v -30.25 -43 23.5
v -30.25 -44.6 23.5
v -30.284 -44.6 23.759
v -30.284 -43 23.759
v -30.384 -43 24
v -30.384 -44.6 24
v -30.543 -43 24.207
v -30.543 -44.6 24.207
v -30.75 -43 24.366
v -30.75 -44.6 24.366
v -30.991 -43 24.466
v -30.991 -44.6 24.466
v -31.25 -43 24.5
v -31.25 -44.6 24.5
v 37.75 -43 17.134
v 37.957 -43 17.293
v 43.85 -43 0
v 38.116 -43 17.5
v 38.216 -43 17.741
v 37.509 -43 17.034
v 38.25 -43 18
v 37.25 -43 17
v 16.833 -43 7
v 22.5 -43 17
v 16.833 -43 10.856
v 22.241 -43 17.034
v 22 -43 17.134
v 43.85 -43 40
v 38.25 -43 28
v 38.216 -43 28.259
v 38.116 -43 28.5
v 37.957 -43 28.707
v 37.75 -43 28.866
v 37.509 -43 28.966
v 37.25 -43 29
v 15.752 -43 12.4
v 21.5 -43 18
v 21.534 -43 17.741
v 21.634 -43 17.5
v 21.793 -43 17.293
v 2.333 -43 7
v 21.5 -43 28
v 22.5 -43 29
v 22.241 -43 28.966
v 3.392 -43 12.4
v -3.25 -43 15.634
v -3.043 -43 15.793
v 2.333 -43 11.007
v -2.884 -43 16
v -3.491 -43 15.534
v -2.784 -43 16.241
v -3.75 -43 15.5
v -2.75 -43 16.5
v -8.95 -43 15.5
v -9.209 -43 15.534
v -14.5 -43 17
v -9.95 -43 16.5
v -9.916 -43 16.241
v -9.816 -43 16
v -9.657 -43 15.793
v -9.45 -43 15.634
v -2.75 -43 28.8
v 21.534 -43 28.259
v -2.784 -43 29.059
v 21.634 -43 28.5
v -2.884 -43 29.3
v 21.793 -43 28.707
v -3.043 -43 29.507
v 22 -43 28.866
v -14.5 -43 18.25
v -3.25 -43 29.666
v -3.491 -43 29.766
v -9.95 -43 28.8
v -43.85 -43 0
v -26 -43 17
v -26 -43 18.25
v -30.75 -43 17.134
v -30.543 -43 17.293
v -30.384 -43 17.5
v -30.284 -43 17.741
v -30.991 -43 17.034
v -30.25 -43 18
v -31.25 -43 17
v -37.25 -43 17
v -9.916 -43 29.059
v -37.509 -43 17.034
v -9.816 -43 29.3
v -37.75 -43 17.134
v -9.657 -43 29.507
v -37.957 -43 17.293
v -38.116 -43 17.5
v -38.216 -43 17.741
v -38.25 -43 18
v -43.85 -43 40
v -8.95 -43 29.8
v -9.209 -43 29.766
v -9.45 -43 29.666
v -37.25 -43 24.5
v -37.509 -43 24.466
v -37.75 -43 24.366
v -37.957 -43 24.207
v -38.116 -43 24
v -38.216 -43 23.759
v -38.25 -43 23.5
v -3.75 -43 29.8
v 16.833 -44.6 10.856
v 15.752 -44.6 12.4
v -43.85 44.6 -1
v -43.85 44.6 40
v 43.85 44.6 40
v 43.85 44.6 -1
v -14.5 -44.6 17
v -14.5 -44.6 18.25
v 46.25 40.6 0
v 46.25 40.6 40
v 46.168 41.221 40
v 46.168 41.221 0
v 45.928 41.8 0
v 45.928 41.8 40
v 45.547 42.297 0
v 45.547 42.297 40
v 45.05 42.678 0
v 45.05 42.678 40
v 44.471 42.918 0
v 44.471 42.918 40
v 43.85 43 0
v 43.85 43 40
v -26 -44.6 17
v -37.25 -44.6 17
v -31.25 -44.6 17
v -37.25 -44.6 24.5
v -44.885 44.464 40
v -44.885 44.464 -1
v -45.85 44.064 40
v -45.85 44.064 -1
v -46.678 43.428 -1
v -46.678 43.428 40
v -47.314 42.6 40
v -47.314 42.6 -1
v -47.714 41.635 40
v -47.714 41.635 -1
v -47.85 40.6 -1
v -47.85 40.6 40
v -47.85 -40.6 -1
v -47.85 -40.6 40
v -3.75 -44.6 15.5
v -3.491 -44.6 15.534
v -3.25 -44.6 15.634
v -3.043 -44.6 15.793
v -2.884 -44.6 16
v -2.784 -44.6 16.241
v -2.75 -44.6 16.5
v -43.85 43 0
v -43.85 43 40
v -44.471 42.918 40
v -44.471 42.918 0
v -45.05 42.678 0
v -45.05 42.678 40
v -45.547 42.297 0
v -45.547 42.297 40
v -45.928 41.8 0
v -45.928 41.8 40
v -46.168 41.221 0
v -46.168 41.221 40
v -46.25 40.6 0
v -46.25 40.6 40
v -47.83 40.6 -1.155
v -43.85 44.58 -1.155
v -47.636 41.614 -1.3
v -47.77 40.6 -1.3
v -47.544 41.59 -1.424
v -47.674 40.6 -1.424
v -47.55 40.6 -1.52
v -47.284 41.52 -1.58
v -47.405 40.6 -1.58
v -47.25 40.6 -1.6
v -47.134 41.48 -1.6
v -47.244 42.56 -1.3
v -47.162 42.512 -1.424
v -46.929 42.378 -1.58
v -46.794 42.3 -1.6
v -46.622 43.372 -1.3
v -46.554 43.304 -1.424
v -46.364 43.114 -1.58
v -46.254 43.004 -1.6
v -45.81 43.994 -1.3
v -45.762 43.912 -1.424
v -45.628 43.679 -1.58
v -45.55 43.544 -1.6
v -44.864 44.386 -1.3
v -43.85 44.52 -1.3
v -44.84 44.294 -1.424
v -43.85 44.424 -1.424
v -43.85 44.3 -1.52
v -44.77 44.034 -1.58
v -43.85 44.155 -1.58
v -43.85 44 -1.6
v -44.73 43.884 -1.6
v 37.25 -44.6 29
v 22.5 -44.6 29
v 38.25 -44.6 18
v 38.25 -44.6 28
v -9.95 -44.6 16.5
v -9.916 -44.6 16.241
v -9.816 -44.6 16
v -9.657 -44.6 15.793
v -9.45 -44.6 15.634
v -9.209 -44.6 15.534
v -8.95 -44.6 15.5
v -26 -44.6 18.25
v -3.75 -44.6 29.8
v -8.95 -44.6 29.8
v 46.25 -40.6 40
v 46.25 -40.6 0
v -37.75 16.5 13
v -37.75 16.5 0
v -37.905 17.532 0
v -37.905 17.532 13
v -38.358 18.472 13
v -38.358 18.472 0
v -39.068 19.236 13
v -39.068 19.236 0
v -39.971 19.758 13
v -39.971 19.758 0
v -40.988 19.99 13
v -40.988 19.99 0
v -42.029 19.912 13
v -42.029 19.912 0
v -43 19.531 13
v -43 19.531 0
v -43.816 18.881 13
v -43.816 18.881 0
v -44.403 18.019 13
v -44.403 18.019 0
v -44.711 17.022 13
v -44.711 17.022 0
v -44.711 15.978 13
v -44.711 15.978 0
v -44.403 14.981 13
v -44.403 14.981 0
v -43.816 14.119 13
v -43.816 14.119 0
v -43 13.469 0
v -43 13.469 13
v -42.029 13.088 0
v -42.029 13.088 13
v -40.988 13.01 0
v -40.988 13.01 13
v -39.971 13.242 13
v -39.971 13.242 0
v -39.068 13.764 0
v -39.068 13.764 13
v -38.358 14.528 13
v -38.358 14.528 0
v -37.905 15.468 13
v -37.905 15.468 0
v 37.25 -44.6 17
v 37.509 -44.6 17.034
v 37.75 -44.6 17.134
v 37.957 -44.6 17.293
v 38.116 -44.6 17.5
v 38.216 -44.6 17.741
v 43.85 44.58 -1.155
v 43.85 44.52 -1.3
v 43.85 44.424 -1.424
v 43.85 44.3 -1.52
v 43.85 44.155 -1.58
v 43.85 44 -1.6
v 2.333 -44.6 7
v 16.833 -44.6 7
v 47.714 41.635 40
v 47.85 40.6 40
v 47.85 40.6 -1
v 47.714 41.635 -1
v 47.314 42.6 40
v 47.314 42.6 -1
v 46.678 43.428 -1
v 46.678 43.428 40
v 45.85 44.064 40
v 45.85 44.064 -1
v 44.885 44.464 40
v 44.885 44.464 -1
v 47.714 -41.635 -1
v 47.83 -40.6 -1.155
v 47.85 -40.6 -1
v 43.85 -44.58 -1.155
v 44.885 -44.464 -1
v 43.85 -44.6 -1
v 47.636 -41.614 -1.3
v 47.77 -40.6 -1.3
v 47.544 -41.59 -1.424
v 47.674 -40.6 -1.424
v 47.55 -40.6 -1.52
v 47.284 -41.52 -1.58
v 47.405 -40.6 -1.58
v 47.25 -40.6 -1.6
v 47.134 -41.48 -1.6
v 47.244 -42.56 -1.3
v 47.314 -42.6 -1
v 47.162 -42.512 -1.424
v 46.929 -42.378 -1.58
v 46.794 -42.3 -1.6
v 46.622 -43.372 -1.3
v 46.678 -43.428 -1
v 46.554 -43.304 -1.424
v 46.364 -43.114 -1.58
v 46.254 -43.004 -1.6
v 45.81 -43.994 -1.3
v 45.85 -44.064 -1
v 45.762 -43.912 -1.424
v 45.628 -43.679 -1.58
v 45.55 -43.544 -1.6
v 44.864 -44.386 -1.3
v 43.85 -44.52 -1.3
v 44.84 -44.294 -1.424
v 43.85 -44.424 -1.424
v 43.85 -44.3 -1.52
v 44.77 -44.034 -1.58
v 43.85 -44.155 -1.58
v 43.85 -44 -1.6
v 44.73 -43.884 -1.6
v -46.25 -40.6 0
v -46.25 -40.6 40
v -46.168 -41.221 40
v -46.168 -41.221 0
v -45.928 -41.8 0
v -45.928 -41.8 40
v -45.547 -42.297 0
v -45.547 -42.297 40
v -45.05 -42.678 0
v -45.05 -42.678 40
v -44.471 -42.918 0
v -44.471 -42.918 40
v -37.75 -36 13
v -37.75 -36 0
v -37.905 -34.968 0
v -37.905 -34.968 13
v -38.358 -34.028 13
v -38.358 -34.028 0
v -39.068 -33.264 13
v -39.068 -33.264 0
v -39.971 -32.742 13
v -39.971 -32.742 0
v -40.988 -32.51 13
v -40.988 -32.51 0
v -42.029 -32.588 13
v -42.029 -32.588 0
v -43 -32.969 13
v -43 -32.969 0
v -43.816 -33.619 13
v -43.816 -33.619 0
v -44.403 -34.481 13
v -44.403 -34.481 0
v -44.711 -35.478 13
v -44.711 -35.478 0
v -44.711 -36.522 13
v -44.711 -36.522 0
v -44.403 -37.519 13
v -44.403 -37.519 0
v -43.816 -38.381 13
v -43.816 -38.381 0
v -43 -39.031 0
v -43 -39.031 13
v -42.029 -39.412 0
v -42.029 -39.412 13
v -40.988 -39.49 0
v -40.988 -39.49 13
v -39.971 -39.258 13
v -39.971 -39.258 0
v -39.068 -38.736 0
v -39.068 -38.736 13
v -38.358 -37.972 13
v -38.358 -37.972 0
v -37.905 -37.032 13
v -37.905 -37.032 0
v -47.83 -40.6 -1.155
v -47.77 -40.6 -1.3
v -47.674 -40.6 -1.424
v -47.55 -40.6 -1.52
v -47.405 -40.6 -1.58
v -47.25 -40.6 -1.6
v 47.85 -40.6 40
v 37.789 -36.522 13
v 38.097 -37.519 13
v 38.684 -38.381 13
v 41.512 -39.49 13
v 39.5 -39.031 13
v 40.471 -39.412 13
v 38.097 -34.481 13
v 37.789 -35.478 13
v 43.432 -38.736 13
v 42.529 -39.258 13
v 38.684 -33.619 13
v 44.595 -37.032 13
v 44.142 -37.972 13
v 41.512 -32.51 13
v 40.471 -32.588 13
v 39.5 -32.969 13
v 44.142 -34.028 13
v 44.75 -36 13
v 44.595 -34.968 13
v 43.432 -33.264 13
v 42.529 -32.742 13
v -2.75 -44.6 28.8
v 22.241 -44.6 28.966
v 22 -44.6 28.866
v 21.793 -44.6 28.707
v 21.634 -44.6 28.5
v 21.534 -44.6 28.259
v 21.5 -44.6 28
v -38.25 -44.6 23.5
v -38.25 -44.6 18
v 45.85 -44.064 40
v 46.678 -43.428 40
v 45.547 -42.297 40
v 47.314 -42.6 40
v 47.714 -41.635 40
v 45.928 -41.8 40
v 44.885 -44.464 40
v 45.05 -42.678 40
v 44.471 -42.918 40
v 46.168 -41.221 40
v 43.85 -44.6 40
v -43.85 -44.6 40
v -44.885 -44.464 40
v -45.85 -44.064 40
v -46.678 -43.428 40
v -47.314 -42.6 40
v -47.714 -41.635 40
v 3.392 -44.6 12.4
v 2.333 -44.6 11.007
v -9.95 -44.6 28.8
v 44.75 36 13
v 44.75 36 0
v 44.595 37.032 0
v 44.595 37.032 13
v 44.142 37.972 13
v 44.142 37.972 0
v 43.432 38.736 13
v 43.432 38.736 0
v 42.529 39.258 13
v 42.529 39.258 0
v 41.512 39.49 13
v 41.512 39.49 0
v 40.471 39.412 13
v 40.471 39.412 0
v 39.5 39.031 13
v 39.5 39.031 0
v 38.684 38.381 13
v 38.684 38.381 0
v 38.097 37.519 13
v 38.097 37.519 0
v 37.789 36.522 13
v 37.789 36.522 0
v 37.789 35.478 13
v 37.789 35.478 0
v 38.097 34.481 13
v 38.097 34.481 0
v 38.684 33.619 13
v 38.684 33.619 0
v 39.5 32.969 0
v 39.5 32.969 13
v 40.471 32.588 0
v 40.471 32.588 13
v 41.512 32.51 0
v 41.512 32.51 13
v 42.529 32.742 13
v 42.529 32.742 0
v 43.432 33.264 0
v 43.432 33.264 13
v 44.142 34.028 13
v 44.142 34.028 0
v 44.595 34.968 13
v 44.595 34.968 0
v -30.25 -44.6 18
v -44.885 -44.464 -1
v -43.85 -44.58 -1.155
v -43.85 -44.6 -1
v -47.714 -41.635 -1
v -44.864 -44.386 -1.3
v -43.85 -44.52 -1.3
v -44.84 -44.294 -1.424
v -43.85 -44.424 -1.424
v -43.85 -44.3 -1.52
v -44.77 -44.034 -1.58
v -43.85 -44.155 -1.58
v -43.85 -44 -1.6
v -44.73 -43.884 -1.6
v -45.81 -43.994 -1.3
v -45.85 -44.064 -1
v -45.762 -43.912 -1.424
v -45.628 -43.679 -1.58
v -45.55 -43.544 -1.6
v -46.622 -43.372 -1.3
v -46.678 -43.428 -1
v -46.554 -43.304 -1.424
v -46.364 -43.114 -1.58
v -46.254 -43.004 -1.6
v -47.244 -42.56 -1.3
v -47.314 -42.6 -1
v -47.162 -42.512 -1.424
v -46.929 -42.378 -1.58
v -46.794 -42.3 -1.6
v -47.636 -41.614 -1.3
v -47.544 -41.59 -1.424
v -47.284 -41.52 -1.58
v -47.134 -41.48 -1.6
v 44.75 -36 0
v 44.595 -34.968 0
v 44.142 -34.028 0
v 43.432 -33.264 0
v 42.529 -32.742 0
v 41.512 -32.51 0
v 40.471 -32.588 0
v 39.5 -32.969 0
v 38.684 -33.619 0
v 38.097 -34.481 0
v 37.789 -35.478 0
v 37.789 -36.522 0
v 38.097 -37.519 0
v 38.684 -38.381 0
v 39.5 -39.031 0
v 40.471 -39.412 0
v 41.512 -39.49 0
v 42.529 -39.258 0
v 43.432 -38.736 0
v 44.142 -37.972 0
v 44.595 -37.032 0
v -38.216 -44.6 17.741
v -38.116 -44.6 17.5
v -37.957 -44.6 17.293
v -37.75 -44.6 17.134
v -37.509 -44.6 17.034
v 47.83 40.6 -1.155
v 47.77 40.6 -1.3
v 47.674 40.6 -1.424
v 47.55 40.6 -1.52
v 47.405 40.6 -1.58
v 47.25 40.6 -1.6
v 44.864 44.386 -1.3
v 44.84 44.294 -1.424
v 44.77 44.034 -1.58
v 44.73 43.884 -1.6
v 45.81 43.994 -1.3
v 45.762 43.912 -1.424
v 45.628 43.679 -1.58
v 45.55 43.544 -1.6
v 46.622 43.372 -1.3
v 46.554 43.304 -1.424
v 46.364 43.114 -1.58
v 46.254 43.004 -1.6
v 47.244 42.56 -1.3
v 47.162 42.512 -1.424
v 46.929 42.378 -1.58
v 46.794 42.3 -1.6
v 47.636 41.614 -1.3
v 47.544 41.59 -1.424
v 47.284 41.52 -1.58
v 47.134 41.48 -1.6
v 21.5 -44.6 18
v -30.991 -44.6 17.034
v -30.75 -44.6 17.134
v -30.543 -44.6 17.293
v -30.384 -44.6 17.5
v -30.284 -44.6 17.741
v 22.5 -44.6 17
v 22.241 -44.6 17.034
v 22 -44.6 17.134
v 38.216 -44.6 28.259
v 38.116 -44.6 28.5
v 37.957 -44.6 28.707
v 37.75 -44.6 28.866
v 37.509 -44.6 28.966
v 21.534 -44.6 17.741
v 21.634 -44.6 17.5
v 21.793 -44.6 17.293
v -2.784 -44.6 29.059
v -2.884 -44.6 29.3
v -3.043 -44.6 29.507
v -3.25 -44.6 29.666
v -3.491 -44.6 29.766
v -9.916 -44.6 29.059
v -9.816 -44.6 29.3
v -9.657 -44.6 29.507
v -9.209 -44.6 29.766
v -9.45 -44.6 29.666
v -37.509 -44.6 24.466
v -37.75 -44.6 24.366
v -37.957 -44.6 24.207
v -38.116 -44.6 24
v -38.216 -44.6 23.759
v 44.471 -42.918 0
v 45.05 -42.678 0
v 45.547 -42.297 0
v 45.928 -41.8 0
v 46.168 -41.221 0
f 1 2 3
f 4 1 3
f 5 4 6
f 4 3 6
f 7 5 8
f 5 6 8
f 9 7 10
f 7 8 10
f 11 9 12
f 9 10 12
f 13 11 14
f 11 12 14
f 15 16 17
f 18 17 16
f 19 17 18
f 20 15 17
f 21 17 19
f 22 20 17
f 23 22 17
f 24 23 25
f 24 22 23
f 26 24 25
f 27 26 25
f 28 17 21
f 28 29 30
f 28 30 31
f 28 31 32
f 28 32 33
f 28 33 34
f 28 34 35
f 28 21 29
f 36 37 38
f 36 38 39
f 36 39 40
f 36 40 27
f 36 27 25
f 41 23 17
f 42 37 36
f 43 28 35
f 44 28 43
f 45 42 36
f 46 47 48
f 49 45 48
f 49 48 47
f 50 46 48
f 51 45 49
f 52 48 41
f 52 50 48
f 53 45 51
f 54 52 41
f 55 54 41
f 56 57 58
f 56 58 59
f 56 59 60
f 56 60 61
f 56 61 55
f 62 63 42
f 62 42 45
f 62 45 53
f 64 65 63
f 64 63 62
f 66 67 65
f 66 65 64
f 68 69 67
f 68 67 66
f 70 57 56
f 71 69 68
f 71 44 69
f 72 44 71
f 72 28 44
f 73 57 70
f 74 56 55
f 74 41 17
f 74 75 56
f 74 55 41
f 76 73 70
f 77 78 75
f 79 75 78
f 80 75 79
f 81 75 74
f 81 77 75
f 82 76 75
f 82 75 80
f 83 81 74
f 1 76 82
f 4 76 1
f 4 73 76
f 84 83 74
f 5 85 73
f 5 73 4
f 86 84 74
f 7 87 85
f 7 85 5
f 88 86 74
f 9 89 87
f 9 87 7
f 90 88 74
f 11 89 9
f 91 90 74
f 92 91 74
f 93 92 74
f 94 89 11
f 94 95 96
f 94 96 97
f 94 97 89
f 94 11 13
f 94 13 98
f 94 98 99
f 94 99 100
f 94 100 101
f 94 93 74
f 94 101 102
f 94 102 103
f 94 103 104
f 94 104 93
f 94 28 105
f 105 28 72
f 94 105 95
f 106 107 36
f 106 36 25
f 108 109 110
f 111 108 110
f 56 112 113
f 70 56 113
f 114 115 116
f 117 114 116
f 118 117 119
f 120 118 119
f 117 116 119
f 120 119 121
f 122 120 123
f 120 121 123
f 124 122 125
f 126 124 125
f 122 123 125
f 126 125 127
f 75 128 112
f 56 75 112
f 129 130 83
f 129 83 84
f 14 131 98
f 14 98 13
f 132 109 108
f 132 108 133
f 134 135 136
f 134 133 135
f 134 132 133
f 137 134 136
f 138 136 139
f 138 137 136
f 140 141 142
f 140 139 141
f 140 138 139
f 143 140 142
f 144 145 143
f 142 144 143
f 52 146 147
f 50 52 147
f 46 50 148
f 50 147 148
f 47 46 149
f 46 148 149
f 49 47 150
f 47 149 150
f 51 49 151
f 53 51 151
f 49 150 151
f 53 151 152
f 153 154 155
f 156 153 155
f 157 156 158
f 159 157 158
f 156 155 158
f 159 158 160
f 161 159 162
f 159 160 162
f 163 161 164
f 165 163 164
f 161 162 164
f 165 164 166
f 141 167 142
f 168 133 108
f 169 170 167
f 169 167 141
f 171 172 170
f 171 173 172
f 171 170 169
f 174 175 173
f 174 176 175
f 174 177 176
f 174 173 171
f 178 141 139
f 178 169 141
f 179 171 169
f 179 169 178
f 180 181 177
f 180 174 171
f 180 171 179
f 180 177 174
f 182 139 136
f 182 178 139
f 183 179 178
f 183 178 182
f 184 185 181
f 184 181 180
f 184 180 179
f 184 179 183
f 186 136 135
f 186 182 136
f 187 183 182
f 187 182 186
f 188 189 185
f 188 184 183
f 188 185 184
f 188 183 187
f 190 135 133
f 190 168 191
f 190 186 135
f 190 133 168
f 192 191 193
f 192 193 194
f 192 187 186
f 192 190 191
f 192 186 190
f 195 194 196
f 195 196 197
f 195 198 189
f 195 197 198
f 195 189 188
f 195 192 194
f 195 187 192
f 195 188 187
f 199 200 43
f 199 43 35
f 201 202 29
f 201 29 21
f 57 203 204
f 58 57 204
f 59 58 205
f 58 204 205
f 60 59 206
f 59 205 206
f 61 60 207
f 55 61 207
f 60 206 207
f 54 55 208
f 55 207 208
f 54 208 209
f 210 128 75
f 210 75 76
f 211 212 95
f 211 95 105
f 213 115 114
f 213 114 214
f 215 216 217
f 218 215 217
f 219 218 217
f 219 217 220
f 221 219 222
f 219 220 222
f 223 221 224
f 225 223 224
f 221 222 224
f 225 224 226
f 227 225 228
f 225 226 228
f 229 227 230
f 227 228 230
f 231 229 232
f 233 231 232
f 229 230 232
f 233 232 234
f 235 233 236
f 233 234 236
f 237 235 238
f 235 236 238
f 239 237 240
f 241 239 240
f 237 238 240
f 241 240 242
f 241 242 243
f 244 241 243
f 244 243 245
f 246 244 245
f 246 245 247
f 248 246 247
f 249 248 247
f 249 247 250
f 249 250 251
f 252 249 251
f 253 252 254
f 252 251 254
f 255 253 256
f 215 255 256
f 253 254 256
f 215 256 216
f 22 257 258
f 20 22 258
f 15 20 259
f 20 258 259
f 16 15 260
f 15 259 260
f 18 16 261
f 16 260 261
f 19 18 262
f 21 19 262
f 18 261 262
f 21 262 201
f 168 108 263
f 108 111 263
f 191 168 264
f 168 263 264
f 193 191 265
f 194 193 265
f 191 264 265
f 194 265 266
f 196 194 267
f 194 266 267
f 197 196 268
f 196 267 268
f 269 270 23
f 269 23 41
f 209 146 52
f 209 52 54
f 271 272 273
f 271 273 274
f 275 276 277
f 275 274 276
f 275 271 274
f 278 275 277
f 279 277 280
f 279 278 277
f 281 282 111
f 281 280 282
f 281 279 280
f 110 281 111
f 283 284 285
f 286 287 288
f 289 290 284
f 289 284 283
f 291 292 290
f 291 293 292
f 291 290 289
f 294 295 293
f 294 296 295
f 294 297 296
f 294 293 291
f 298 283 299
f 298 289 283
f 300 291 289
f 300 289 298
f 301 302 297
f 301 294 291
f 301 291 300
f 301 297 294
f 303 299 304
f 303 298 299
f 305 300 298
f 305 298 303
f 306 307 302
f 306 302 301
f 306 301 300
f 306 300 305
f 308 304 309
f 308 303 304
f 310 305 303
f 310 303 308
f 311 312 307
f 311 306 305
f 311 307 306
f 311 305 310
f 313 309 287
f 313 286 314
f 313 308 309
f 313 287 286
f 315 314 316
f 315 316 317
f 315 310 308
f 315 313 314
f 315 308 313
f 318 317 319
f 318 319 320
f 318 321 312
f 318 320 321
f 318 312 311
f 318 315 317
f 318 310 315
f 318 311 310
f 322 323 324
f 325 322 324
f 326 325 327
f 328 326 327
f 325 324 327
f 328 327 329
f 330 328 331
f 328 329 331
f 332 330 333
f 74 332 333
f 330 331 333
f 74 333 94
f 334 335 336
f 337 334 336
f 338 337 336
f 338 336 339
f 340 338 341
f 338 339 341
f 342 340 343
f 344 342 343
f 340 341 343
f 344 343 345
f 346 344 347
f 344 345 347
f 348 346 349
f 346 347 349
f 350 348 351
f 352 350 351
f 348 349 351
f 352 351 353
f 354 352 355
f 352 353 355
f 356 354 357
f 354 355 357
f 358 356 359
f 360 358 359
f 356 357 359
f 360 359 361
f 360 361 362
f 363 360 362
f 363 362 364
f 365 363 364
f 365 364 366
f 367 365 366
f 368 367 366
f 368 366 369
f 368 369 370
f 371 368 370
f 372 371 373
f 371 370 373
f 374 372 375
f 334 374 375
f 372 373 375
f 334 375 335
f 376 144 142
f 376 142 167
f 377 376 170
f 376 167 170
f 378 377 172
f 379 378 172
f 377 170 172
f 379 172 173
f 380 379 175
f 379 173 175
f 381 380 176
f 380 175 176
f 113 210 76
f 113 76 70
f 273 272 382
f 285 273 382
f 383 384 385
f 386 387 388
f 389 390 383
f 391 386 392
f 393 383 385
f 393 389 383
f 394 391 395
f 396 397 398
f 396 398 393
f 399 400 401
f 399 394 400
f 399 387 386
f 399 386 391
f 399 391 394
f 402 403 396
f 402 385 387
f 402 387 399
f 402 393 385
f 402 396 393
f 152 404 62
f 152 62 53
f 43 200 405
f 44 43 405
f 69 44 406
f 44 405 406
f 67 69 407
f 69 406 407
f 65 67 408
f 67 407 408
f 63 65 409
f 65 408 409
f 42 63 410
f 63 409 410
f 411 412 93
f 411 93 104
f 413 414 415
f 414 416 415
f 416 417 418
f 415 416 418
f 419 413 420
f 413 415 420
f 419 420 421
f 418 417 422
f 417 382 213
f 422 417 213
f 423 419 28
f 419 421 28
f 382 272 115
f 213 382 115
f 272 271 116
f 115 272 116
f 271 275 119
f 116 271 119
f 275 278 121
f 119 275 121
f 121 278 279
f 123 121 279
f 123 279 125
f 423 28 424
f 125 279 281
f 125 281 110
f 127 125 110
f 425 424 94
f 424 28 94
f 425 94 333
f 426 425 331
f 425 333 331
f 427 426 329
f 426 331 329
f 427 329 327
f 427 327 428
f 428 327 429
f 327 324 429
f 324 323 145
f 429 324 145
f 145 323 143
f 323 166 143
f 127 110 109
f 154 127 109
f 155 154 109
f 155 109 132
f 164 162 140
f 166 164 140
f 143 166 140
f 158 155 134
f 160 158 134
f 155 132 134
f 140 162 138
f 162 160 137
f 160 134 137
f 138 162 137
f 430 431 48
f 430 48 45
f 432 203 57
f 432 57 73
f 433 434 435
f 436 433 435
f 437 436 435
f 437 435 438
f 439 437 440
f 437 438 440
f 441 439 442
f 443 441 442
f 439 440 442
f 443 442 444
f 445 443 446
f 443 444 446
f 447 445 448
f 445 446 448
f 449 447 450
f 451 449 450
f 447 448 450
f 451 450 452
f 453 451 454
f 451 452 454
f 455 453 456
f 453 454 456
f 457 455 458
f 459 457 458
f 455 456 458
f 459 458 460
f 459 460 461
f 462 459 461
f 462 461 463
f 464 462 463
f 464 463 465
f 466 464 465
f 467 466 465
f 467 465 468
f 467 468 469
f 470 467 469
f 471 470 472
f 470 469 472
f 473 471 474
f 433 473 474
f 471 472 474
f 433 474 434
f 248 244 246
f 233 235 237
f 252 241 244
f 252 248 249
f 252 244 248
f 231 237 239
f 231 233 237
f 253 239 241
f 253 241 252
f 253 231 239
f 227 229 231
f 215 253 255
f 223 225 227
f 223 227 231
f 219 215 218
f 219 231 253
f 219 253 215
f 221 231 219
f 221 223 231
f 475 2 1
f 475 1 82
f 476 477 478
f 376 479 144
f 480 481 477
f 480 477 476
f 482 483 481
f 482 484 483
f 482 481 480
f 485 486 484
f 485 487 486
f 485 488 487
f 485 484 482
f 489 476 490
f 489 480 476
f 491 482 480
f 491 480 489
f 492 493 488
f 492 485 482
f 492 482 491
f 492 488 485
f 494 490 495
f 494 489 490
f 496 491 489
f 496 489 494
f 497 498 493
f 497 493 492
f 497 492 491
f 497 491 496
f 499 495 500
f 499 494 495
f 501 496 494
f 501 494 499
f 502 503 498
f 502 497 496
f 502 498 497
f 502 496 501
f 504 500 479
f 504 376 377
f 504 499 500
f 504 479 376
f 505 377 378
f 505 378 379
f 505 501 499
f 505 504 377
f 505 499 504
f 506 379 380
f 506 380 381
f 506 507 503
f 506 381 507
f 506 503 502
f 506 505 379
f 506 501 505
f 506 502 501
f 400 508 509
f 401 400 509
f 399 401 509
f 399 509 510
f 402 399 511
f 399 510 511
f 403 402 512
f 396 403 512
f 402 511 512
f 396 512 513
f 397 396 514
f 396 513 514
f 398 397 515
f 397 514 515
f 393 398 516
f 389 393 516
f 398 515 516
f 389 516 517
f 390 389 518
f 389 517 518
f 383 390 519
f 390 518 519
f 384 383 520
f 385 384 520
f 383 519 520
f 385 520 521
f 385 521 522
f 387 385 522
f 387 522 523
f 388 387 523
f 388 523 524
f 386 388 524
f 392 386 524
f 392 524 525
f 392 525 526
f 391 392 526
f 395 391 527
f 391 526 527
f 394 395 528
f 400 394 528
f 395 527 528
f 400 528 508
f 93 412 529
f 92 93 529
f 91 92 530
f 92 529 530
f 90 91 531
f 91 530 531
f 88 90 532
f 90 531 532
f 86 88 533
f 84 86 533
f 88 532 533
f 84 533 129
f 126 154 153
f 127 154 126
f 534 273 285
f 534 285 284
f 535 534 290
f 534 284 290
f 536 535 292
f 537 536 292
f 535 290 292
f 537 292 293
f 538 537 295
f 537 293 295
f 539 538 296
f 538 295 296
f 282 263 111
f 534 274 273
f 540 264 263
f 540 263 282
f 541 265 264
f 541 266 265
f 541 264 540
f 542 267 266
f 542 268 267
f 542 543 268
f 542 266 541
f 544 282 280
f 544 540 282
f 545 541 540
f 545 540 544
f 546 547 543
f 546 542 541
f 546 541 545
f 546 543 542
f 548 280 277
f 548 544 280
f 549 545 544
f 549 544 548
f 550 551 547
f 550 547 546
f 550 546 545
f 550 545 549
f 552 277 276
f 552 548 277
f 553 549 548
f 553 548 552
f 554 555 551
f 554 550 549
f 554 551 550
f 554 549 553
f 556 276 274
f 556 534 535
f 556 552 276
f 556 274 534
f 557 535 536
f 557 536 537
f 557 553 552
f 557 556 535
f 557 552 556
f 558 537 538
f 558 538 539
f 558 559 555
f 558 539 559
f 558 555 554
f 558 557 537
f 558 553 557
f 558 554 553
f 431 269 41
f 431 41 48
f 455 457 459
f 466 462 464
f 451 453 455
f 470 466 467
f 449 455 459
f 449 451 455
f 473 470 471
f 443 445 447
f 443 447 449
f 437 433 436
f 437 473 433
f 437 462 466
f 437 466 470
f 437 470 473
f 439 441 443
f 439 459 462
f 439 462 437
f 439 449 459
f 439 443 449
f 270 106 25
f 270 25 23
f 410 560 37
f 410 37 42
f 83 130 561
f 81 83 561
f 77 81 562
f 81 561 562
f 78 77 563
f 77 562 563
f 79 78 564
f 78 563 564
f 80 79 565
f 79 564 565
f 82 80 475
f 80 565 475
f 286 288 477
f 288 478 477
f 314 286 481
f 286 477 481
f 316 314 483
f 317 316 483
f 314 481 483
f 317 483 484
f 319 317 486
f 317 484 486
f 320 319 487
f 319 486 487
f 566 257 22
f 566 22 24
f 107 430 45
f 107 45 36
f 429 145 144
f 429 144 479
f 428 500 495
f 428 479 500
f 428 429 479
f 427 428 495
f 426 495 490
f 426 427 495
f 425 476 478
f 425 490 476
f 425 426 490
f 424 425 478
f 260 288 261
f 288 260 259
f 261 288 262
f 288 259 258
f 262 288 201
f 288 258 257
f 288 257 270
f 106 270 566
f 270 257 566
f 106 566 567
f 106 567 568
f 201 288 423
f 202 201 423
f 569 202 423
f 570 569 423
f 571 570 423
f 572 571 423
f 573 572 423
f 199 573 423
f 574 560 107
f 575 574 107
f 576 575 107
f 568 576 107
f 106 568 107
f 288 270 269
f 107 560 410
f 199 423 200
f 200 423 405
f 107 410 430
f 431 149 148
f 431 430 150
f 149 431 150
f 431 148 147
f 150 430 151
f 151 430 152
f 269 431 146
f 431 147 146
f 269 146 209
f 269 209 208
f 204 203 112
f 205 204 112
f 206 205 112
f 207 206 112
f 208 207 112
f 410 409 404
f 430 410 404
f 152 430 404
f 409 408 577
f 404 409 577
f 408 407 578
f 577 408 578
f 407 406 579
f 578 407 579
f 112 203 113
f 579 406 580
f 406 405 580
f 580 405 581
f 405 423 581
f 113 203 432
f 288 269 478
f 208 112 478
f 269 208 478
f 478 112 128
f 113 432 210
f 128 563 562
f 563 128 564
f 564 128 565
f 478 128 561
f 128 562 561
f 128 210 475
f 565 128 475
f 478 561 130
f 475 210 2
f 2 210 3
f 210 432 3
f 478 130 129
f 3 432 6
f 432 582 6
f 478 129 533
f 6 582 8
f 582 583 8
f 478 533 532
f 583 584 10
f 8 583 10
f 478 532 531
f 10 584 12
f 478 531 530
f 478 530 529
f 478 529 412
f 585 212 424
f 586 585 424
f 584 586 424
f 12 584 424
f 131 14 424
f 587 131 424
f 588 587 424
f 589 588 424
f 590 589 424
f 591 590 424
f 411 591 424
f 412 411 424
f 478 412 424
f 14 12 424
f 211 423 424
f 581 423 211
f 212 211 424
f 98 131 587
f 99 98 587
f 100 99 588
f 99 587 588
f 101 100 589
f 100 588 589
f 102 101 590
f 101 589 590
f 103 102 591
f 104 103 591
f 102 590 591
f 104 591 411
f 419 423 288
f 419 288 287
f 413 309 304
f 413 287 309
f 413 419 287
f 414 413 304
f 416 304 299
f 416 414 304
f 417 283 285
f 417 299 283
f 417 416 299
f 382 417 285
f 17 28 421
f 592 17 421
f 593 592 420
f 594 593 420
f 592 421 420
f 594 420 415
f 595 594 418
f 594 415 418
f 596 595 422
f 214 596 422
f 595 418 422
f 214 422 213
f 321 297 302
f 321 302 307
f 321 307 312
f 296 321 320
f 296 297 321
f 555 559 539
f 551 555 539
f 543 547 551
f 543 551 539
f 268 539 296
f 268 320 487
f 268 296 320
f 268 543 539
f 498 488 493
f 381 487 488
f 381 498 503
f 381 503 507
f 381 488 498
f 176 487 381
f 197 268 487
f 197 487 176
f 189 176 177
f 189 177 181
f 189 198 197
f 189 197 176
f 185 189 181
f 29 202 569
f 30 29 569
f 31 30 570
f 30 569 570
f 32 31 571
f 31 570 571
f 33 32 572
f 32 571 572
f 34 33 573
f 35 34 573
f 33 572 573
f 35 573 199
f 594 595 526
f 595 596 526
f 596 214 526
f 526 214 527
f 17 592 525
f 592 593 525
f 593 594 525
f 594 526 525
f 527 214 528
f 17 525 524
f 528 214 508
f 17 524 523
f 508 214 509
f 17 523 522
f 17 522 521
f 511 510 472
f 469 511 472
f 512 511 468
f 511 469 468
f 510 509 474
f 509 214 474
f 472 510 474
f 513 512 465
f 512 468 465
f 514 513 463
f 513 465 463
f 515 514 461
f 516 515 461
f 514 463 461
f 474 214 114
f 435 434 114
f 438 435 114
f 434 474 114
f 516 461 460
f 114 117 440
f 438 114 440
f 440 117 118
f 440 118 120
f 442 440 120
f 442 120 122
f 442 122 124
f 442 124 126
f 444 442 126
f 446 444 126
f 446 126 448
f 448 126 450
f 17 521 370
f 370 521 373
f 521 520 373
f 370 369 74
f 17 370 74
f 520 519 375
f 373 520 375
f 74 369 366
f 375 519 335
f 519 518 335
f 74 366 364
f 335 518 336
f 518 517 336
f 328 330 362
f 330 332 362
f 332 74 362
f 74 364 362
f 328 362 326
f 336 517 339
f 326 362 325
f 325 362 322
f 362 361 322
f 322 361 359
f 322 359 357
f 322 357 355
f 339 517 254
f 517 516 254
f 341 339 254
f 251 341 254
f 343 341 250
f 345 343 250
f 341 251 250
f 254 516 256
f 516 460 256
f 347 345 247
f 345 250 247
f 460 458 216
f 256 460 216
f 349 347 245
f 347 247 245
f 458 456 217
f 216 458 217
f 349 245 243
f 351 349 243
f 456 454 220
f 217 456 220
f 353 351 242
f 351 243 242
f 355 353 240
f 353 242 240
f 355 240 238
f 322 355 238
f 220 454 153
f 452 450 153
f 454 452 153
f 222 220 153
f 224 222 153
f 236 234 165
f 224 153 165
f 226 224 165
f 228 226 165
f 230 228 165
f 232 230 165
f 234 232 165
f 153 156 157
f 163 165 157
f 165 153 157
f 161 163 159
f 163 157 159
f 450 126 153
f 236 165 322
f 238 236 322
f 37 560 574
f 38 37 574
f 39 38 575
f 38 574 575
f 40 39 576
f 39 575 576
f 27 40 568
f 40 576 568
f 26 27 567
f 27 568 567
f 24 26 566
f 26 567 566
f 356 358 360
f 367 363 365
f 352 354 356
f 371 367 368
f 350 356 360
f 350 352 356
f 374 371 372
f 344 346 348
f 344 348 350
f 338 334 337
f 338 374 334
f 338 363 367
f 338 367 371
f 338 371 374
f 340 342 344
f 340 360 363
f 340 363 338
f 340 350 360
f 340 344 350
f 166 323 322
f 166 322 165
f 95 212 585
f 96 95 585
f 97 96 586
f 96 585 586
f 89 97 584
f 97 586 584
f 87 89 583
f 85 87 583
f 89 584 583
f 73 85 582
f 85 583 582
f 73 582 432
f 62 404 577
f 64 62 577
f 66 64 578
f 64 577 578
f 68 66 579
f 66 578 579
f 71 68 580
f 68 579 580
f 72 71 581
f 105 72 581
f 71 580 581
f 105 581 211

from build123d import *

# Parameters (mm, degrees)
SKETCH004_W    = 11.5
SKETCH004_H    = 1.25
PAD003_DEPTH   = 3
PAD_DEPTH      = 40
PAD_DEPTH_BACK = 1.6
THICKNESS_T    = -1.6
SKETCH002_R    = 1.75
PAD001_DEPTH   = 13
SKETCH003_R    = 3.5
PAD002_DEPTH   = 13
FILLET_R       = 0.6


with BuildPart() as pad003:
    # Sketch004 → Pad003 (new body)
    with BuildSketch(Plane.XZ.offset(44.6)):
        with BuildLine():
            Line((22.5, 29), (37.25, 29))
            ThreePointArc((38.25, 28), (37.957107, 28.707107), (37.25, 29))
            Line((38.25, 28), (38.25, 18))
            ThreePointArc((37.25, 17), (37.957107, 17.292893), (38.25, 18))
            Line((37.25, 17), (22.5, 17))
            ThreePointArc((21.5, 18), (21.792893, 17.292893), (22.5, 17))
            Line((21.5, 18), (21.5, 28))
            ThreePointArc((22.5, 29), (21.792893, 28.707107), (21.5, 28))
        make_face()
        with BuildLine():
            Line((-8.95, 29.8), (-3.75, 29.8))
            ThreePointArc((-2.75, 28.8), (-3.042893, 29.507107), (-3.75, 29.8))
            Line((-2.75, 28.8), (-2.75, 16.5))
            ThreePointArc((-3.75, 15.5), (-3.042893, 15.792893), (-2.75, 16.5))
            Line((-3.75, 15.5), (-8.95, 15.5))
            ThreePointArc((-9.95, 16.5), (-9.657107, 15.792893), (-8.95, 15.5))
            Line((-9.95, 16.5), (-9.95, 28.8))
            ThreePointArc((-8.95, 29.8), (-9.657107, 29.507107), (-9.95, 28.8))
        make_face()
        with BuildLine():
            Line((-37.25, 24.5), (-31.25, 24.5))
            ThreePointArc((-30.25, 23.5), (-30.542893, 24.207107), (-31.25, 24.5))
            Line((-30.25, 23.5), (-30.25, 18))
            ThreePointArc((-31.25, 17), (-30.542893, 17.292893), (-30.25, 18))
            Line((-31.25, 17), (-37.25, 17))
            ThreePointArc((-38.25, 18), (-37.957107, 17.292893), (-37.25, 17))
            Line((-38.25, 18), (-38.25, 23.5))
            ThreePointArc((-37.25, 24.5), (-37.957107, 24.207107), (-38.25, 23.5))
        make_face()
        with Locations((-20.25, 17.625)):
            Rectangle(SKETCH004_W, SKETCH004_H)
        Polygon((2.333401, 7), (2.333401, 11.006851), (3.391764, 12.4), (15.751917, 12.4), (16.833401, 10.855655), (16.833401, 7), align=None)
    extrude(amount=-PAD003_DEPTH)


with BuildPart() as fillet_body:
    # Sketch001 → Pad (new body, two sides)
    with BuildSketch(Plane.XY) as pad_sk:
        with BuildLine():
            Line((-43.85, 44.6), (43.85, 44.6))
            ThreePointArc((47.85, 40.6), (46.678427, 43.428427), (43.85, 44.6))
            Line((47.85, 40.6), (47.85, -40.6))
            ThreePointArc((43.85, -44.6), (46.678427, -43.428427), (47.85, -40.6))
            Line((43.85, -44.6), (-43.85, -44.6))
            ThreePointArc((-47.85, -40.6), (-46.678427, -43.428427), (-43.85, -44.6))
            Line((-47.85, -40.6), (-47.85, 40.6))
            ThreePointArc((-43.85, 44.6), (-46.678427, 43.428427), (-47.85, 40.6))
        make_face()
    extrude(amount=PAD_DEPTH)
    extrude(pad_sk.sketch, amount=-PAD_DEPTH_BACK)

    # Thickness
    thickness_openings = [fillet_body.faces().sort_by_distance(p)[0] for p in [
        (0, 0, 40),
    ]]
    offset(amount=THICKNESS_T, openings=thickness_openings)

    # Sketch002 → Pad001 (new body)
    with BuildSketch(Plane.XY):
        with Locations((-41.25, -36)):
            Circle(SKETCH002_R)
        with Locations((41.25, -36)):
            Circle(SKETCH002_R)
        with Locations((-41.25, 16.5)):
            Circle(SKETCH002_R)
        with Locations((41.25, 36)):
            Circle(SKETCH002_R)
    extrude(amount=PAD001_DEPTH)

    # Sketch003 → Pad002 (new body)
    with BuildSketch(Plane.XY):
        with Locations((41.25, -36)):
            Circle(SKETCH003_R)
        with Locations((41.25, 36)):
            Circle(SKETCH003_R)
        with Locations((-41.25, 16.5)):
            Circle(SKETCH003_R)
        with Locations((-41.25, -36)):
            Circle(SKETCH003_R)
    extrude(amount=PAD002_DEPTH)

    # Cut: cut Pad003
    add(pad003.part, mode=Mode.SUBTRACT)

    # Fillet
    fillet_edges = [fillet_body.edges().sort_by_distance(p)[0] for p in [
        (0, 44.6, -1.6),
        (46.678427, 43.428427, -1.6),
        (47.85, 0, -1.6),
        (46.678427, -43.428427, -1.6),
        (0, -44.6, -1.6),
        (-46.678427, -43.428427, -1.6),
        (-47.85, 0, -1.6),
        (-46.678427, 43.428427, -1.6),
    ]]
    fillet(fillet_edges, radius=FILLET_R)


solid = fillet_body.part
